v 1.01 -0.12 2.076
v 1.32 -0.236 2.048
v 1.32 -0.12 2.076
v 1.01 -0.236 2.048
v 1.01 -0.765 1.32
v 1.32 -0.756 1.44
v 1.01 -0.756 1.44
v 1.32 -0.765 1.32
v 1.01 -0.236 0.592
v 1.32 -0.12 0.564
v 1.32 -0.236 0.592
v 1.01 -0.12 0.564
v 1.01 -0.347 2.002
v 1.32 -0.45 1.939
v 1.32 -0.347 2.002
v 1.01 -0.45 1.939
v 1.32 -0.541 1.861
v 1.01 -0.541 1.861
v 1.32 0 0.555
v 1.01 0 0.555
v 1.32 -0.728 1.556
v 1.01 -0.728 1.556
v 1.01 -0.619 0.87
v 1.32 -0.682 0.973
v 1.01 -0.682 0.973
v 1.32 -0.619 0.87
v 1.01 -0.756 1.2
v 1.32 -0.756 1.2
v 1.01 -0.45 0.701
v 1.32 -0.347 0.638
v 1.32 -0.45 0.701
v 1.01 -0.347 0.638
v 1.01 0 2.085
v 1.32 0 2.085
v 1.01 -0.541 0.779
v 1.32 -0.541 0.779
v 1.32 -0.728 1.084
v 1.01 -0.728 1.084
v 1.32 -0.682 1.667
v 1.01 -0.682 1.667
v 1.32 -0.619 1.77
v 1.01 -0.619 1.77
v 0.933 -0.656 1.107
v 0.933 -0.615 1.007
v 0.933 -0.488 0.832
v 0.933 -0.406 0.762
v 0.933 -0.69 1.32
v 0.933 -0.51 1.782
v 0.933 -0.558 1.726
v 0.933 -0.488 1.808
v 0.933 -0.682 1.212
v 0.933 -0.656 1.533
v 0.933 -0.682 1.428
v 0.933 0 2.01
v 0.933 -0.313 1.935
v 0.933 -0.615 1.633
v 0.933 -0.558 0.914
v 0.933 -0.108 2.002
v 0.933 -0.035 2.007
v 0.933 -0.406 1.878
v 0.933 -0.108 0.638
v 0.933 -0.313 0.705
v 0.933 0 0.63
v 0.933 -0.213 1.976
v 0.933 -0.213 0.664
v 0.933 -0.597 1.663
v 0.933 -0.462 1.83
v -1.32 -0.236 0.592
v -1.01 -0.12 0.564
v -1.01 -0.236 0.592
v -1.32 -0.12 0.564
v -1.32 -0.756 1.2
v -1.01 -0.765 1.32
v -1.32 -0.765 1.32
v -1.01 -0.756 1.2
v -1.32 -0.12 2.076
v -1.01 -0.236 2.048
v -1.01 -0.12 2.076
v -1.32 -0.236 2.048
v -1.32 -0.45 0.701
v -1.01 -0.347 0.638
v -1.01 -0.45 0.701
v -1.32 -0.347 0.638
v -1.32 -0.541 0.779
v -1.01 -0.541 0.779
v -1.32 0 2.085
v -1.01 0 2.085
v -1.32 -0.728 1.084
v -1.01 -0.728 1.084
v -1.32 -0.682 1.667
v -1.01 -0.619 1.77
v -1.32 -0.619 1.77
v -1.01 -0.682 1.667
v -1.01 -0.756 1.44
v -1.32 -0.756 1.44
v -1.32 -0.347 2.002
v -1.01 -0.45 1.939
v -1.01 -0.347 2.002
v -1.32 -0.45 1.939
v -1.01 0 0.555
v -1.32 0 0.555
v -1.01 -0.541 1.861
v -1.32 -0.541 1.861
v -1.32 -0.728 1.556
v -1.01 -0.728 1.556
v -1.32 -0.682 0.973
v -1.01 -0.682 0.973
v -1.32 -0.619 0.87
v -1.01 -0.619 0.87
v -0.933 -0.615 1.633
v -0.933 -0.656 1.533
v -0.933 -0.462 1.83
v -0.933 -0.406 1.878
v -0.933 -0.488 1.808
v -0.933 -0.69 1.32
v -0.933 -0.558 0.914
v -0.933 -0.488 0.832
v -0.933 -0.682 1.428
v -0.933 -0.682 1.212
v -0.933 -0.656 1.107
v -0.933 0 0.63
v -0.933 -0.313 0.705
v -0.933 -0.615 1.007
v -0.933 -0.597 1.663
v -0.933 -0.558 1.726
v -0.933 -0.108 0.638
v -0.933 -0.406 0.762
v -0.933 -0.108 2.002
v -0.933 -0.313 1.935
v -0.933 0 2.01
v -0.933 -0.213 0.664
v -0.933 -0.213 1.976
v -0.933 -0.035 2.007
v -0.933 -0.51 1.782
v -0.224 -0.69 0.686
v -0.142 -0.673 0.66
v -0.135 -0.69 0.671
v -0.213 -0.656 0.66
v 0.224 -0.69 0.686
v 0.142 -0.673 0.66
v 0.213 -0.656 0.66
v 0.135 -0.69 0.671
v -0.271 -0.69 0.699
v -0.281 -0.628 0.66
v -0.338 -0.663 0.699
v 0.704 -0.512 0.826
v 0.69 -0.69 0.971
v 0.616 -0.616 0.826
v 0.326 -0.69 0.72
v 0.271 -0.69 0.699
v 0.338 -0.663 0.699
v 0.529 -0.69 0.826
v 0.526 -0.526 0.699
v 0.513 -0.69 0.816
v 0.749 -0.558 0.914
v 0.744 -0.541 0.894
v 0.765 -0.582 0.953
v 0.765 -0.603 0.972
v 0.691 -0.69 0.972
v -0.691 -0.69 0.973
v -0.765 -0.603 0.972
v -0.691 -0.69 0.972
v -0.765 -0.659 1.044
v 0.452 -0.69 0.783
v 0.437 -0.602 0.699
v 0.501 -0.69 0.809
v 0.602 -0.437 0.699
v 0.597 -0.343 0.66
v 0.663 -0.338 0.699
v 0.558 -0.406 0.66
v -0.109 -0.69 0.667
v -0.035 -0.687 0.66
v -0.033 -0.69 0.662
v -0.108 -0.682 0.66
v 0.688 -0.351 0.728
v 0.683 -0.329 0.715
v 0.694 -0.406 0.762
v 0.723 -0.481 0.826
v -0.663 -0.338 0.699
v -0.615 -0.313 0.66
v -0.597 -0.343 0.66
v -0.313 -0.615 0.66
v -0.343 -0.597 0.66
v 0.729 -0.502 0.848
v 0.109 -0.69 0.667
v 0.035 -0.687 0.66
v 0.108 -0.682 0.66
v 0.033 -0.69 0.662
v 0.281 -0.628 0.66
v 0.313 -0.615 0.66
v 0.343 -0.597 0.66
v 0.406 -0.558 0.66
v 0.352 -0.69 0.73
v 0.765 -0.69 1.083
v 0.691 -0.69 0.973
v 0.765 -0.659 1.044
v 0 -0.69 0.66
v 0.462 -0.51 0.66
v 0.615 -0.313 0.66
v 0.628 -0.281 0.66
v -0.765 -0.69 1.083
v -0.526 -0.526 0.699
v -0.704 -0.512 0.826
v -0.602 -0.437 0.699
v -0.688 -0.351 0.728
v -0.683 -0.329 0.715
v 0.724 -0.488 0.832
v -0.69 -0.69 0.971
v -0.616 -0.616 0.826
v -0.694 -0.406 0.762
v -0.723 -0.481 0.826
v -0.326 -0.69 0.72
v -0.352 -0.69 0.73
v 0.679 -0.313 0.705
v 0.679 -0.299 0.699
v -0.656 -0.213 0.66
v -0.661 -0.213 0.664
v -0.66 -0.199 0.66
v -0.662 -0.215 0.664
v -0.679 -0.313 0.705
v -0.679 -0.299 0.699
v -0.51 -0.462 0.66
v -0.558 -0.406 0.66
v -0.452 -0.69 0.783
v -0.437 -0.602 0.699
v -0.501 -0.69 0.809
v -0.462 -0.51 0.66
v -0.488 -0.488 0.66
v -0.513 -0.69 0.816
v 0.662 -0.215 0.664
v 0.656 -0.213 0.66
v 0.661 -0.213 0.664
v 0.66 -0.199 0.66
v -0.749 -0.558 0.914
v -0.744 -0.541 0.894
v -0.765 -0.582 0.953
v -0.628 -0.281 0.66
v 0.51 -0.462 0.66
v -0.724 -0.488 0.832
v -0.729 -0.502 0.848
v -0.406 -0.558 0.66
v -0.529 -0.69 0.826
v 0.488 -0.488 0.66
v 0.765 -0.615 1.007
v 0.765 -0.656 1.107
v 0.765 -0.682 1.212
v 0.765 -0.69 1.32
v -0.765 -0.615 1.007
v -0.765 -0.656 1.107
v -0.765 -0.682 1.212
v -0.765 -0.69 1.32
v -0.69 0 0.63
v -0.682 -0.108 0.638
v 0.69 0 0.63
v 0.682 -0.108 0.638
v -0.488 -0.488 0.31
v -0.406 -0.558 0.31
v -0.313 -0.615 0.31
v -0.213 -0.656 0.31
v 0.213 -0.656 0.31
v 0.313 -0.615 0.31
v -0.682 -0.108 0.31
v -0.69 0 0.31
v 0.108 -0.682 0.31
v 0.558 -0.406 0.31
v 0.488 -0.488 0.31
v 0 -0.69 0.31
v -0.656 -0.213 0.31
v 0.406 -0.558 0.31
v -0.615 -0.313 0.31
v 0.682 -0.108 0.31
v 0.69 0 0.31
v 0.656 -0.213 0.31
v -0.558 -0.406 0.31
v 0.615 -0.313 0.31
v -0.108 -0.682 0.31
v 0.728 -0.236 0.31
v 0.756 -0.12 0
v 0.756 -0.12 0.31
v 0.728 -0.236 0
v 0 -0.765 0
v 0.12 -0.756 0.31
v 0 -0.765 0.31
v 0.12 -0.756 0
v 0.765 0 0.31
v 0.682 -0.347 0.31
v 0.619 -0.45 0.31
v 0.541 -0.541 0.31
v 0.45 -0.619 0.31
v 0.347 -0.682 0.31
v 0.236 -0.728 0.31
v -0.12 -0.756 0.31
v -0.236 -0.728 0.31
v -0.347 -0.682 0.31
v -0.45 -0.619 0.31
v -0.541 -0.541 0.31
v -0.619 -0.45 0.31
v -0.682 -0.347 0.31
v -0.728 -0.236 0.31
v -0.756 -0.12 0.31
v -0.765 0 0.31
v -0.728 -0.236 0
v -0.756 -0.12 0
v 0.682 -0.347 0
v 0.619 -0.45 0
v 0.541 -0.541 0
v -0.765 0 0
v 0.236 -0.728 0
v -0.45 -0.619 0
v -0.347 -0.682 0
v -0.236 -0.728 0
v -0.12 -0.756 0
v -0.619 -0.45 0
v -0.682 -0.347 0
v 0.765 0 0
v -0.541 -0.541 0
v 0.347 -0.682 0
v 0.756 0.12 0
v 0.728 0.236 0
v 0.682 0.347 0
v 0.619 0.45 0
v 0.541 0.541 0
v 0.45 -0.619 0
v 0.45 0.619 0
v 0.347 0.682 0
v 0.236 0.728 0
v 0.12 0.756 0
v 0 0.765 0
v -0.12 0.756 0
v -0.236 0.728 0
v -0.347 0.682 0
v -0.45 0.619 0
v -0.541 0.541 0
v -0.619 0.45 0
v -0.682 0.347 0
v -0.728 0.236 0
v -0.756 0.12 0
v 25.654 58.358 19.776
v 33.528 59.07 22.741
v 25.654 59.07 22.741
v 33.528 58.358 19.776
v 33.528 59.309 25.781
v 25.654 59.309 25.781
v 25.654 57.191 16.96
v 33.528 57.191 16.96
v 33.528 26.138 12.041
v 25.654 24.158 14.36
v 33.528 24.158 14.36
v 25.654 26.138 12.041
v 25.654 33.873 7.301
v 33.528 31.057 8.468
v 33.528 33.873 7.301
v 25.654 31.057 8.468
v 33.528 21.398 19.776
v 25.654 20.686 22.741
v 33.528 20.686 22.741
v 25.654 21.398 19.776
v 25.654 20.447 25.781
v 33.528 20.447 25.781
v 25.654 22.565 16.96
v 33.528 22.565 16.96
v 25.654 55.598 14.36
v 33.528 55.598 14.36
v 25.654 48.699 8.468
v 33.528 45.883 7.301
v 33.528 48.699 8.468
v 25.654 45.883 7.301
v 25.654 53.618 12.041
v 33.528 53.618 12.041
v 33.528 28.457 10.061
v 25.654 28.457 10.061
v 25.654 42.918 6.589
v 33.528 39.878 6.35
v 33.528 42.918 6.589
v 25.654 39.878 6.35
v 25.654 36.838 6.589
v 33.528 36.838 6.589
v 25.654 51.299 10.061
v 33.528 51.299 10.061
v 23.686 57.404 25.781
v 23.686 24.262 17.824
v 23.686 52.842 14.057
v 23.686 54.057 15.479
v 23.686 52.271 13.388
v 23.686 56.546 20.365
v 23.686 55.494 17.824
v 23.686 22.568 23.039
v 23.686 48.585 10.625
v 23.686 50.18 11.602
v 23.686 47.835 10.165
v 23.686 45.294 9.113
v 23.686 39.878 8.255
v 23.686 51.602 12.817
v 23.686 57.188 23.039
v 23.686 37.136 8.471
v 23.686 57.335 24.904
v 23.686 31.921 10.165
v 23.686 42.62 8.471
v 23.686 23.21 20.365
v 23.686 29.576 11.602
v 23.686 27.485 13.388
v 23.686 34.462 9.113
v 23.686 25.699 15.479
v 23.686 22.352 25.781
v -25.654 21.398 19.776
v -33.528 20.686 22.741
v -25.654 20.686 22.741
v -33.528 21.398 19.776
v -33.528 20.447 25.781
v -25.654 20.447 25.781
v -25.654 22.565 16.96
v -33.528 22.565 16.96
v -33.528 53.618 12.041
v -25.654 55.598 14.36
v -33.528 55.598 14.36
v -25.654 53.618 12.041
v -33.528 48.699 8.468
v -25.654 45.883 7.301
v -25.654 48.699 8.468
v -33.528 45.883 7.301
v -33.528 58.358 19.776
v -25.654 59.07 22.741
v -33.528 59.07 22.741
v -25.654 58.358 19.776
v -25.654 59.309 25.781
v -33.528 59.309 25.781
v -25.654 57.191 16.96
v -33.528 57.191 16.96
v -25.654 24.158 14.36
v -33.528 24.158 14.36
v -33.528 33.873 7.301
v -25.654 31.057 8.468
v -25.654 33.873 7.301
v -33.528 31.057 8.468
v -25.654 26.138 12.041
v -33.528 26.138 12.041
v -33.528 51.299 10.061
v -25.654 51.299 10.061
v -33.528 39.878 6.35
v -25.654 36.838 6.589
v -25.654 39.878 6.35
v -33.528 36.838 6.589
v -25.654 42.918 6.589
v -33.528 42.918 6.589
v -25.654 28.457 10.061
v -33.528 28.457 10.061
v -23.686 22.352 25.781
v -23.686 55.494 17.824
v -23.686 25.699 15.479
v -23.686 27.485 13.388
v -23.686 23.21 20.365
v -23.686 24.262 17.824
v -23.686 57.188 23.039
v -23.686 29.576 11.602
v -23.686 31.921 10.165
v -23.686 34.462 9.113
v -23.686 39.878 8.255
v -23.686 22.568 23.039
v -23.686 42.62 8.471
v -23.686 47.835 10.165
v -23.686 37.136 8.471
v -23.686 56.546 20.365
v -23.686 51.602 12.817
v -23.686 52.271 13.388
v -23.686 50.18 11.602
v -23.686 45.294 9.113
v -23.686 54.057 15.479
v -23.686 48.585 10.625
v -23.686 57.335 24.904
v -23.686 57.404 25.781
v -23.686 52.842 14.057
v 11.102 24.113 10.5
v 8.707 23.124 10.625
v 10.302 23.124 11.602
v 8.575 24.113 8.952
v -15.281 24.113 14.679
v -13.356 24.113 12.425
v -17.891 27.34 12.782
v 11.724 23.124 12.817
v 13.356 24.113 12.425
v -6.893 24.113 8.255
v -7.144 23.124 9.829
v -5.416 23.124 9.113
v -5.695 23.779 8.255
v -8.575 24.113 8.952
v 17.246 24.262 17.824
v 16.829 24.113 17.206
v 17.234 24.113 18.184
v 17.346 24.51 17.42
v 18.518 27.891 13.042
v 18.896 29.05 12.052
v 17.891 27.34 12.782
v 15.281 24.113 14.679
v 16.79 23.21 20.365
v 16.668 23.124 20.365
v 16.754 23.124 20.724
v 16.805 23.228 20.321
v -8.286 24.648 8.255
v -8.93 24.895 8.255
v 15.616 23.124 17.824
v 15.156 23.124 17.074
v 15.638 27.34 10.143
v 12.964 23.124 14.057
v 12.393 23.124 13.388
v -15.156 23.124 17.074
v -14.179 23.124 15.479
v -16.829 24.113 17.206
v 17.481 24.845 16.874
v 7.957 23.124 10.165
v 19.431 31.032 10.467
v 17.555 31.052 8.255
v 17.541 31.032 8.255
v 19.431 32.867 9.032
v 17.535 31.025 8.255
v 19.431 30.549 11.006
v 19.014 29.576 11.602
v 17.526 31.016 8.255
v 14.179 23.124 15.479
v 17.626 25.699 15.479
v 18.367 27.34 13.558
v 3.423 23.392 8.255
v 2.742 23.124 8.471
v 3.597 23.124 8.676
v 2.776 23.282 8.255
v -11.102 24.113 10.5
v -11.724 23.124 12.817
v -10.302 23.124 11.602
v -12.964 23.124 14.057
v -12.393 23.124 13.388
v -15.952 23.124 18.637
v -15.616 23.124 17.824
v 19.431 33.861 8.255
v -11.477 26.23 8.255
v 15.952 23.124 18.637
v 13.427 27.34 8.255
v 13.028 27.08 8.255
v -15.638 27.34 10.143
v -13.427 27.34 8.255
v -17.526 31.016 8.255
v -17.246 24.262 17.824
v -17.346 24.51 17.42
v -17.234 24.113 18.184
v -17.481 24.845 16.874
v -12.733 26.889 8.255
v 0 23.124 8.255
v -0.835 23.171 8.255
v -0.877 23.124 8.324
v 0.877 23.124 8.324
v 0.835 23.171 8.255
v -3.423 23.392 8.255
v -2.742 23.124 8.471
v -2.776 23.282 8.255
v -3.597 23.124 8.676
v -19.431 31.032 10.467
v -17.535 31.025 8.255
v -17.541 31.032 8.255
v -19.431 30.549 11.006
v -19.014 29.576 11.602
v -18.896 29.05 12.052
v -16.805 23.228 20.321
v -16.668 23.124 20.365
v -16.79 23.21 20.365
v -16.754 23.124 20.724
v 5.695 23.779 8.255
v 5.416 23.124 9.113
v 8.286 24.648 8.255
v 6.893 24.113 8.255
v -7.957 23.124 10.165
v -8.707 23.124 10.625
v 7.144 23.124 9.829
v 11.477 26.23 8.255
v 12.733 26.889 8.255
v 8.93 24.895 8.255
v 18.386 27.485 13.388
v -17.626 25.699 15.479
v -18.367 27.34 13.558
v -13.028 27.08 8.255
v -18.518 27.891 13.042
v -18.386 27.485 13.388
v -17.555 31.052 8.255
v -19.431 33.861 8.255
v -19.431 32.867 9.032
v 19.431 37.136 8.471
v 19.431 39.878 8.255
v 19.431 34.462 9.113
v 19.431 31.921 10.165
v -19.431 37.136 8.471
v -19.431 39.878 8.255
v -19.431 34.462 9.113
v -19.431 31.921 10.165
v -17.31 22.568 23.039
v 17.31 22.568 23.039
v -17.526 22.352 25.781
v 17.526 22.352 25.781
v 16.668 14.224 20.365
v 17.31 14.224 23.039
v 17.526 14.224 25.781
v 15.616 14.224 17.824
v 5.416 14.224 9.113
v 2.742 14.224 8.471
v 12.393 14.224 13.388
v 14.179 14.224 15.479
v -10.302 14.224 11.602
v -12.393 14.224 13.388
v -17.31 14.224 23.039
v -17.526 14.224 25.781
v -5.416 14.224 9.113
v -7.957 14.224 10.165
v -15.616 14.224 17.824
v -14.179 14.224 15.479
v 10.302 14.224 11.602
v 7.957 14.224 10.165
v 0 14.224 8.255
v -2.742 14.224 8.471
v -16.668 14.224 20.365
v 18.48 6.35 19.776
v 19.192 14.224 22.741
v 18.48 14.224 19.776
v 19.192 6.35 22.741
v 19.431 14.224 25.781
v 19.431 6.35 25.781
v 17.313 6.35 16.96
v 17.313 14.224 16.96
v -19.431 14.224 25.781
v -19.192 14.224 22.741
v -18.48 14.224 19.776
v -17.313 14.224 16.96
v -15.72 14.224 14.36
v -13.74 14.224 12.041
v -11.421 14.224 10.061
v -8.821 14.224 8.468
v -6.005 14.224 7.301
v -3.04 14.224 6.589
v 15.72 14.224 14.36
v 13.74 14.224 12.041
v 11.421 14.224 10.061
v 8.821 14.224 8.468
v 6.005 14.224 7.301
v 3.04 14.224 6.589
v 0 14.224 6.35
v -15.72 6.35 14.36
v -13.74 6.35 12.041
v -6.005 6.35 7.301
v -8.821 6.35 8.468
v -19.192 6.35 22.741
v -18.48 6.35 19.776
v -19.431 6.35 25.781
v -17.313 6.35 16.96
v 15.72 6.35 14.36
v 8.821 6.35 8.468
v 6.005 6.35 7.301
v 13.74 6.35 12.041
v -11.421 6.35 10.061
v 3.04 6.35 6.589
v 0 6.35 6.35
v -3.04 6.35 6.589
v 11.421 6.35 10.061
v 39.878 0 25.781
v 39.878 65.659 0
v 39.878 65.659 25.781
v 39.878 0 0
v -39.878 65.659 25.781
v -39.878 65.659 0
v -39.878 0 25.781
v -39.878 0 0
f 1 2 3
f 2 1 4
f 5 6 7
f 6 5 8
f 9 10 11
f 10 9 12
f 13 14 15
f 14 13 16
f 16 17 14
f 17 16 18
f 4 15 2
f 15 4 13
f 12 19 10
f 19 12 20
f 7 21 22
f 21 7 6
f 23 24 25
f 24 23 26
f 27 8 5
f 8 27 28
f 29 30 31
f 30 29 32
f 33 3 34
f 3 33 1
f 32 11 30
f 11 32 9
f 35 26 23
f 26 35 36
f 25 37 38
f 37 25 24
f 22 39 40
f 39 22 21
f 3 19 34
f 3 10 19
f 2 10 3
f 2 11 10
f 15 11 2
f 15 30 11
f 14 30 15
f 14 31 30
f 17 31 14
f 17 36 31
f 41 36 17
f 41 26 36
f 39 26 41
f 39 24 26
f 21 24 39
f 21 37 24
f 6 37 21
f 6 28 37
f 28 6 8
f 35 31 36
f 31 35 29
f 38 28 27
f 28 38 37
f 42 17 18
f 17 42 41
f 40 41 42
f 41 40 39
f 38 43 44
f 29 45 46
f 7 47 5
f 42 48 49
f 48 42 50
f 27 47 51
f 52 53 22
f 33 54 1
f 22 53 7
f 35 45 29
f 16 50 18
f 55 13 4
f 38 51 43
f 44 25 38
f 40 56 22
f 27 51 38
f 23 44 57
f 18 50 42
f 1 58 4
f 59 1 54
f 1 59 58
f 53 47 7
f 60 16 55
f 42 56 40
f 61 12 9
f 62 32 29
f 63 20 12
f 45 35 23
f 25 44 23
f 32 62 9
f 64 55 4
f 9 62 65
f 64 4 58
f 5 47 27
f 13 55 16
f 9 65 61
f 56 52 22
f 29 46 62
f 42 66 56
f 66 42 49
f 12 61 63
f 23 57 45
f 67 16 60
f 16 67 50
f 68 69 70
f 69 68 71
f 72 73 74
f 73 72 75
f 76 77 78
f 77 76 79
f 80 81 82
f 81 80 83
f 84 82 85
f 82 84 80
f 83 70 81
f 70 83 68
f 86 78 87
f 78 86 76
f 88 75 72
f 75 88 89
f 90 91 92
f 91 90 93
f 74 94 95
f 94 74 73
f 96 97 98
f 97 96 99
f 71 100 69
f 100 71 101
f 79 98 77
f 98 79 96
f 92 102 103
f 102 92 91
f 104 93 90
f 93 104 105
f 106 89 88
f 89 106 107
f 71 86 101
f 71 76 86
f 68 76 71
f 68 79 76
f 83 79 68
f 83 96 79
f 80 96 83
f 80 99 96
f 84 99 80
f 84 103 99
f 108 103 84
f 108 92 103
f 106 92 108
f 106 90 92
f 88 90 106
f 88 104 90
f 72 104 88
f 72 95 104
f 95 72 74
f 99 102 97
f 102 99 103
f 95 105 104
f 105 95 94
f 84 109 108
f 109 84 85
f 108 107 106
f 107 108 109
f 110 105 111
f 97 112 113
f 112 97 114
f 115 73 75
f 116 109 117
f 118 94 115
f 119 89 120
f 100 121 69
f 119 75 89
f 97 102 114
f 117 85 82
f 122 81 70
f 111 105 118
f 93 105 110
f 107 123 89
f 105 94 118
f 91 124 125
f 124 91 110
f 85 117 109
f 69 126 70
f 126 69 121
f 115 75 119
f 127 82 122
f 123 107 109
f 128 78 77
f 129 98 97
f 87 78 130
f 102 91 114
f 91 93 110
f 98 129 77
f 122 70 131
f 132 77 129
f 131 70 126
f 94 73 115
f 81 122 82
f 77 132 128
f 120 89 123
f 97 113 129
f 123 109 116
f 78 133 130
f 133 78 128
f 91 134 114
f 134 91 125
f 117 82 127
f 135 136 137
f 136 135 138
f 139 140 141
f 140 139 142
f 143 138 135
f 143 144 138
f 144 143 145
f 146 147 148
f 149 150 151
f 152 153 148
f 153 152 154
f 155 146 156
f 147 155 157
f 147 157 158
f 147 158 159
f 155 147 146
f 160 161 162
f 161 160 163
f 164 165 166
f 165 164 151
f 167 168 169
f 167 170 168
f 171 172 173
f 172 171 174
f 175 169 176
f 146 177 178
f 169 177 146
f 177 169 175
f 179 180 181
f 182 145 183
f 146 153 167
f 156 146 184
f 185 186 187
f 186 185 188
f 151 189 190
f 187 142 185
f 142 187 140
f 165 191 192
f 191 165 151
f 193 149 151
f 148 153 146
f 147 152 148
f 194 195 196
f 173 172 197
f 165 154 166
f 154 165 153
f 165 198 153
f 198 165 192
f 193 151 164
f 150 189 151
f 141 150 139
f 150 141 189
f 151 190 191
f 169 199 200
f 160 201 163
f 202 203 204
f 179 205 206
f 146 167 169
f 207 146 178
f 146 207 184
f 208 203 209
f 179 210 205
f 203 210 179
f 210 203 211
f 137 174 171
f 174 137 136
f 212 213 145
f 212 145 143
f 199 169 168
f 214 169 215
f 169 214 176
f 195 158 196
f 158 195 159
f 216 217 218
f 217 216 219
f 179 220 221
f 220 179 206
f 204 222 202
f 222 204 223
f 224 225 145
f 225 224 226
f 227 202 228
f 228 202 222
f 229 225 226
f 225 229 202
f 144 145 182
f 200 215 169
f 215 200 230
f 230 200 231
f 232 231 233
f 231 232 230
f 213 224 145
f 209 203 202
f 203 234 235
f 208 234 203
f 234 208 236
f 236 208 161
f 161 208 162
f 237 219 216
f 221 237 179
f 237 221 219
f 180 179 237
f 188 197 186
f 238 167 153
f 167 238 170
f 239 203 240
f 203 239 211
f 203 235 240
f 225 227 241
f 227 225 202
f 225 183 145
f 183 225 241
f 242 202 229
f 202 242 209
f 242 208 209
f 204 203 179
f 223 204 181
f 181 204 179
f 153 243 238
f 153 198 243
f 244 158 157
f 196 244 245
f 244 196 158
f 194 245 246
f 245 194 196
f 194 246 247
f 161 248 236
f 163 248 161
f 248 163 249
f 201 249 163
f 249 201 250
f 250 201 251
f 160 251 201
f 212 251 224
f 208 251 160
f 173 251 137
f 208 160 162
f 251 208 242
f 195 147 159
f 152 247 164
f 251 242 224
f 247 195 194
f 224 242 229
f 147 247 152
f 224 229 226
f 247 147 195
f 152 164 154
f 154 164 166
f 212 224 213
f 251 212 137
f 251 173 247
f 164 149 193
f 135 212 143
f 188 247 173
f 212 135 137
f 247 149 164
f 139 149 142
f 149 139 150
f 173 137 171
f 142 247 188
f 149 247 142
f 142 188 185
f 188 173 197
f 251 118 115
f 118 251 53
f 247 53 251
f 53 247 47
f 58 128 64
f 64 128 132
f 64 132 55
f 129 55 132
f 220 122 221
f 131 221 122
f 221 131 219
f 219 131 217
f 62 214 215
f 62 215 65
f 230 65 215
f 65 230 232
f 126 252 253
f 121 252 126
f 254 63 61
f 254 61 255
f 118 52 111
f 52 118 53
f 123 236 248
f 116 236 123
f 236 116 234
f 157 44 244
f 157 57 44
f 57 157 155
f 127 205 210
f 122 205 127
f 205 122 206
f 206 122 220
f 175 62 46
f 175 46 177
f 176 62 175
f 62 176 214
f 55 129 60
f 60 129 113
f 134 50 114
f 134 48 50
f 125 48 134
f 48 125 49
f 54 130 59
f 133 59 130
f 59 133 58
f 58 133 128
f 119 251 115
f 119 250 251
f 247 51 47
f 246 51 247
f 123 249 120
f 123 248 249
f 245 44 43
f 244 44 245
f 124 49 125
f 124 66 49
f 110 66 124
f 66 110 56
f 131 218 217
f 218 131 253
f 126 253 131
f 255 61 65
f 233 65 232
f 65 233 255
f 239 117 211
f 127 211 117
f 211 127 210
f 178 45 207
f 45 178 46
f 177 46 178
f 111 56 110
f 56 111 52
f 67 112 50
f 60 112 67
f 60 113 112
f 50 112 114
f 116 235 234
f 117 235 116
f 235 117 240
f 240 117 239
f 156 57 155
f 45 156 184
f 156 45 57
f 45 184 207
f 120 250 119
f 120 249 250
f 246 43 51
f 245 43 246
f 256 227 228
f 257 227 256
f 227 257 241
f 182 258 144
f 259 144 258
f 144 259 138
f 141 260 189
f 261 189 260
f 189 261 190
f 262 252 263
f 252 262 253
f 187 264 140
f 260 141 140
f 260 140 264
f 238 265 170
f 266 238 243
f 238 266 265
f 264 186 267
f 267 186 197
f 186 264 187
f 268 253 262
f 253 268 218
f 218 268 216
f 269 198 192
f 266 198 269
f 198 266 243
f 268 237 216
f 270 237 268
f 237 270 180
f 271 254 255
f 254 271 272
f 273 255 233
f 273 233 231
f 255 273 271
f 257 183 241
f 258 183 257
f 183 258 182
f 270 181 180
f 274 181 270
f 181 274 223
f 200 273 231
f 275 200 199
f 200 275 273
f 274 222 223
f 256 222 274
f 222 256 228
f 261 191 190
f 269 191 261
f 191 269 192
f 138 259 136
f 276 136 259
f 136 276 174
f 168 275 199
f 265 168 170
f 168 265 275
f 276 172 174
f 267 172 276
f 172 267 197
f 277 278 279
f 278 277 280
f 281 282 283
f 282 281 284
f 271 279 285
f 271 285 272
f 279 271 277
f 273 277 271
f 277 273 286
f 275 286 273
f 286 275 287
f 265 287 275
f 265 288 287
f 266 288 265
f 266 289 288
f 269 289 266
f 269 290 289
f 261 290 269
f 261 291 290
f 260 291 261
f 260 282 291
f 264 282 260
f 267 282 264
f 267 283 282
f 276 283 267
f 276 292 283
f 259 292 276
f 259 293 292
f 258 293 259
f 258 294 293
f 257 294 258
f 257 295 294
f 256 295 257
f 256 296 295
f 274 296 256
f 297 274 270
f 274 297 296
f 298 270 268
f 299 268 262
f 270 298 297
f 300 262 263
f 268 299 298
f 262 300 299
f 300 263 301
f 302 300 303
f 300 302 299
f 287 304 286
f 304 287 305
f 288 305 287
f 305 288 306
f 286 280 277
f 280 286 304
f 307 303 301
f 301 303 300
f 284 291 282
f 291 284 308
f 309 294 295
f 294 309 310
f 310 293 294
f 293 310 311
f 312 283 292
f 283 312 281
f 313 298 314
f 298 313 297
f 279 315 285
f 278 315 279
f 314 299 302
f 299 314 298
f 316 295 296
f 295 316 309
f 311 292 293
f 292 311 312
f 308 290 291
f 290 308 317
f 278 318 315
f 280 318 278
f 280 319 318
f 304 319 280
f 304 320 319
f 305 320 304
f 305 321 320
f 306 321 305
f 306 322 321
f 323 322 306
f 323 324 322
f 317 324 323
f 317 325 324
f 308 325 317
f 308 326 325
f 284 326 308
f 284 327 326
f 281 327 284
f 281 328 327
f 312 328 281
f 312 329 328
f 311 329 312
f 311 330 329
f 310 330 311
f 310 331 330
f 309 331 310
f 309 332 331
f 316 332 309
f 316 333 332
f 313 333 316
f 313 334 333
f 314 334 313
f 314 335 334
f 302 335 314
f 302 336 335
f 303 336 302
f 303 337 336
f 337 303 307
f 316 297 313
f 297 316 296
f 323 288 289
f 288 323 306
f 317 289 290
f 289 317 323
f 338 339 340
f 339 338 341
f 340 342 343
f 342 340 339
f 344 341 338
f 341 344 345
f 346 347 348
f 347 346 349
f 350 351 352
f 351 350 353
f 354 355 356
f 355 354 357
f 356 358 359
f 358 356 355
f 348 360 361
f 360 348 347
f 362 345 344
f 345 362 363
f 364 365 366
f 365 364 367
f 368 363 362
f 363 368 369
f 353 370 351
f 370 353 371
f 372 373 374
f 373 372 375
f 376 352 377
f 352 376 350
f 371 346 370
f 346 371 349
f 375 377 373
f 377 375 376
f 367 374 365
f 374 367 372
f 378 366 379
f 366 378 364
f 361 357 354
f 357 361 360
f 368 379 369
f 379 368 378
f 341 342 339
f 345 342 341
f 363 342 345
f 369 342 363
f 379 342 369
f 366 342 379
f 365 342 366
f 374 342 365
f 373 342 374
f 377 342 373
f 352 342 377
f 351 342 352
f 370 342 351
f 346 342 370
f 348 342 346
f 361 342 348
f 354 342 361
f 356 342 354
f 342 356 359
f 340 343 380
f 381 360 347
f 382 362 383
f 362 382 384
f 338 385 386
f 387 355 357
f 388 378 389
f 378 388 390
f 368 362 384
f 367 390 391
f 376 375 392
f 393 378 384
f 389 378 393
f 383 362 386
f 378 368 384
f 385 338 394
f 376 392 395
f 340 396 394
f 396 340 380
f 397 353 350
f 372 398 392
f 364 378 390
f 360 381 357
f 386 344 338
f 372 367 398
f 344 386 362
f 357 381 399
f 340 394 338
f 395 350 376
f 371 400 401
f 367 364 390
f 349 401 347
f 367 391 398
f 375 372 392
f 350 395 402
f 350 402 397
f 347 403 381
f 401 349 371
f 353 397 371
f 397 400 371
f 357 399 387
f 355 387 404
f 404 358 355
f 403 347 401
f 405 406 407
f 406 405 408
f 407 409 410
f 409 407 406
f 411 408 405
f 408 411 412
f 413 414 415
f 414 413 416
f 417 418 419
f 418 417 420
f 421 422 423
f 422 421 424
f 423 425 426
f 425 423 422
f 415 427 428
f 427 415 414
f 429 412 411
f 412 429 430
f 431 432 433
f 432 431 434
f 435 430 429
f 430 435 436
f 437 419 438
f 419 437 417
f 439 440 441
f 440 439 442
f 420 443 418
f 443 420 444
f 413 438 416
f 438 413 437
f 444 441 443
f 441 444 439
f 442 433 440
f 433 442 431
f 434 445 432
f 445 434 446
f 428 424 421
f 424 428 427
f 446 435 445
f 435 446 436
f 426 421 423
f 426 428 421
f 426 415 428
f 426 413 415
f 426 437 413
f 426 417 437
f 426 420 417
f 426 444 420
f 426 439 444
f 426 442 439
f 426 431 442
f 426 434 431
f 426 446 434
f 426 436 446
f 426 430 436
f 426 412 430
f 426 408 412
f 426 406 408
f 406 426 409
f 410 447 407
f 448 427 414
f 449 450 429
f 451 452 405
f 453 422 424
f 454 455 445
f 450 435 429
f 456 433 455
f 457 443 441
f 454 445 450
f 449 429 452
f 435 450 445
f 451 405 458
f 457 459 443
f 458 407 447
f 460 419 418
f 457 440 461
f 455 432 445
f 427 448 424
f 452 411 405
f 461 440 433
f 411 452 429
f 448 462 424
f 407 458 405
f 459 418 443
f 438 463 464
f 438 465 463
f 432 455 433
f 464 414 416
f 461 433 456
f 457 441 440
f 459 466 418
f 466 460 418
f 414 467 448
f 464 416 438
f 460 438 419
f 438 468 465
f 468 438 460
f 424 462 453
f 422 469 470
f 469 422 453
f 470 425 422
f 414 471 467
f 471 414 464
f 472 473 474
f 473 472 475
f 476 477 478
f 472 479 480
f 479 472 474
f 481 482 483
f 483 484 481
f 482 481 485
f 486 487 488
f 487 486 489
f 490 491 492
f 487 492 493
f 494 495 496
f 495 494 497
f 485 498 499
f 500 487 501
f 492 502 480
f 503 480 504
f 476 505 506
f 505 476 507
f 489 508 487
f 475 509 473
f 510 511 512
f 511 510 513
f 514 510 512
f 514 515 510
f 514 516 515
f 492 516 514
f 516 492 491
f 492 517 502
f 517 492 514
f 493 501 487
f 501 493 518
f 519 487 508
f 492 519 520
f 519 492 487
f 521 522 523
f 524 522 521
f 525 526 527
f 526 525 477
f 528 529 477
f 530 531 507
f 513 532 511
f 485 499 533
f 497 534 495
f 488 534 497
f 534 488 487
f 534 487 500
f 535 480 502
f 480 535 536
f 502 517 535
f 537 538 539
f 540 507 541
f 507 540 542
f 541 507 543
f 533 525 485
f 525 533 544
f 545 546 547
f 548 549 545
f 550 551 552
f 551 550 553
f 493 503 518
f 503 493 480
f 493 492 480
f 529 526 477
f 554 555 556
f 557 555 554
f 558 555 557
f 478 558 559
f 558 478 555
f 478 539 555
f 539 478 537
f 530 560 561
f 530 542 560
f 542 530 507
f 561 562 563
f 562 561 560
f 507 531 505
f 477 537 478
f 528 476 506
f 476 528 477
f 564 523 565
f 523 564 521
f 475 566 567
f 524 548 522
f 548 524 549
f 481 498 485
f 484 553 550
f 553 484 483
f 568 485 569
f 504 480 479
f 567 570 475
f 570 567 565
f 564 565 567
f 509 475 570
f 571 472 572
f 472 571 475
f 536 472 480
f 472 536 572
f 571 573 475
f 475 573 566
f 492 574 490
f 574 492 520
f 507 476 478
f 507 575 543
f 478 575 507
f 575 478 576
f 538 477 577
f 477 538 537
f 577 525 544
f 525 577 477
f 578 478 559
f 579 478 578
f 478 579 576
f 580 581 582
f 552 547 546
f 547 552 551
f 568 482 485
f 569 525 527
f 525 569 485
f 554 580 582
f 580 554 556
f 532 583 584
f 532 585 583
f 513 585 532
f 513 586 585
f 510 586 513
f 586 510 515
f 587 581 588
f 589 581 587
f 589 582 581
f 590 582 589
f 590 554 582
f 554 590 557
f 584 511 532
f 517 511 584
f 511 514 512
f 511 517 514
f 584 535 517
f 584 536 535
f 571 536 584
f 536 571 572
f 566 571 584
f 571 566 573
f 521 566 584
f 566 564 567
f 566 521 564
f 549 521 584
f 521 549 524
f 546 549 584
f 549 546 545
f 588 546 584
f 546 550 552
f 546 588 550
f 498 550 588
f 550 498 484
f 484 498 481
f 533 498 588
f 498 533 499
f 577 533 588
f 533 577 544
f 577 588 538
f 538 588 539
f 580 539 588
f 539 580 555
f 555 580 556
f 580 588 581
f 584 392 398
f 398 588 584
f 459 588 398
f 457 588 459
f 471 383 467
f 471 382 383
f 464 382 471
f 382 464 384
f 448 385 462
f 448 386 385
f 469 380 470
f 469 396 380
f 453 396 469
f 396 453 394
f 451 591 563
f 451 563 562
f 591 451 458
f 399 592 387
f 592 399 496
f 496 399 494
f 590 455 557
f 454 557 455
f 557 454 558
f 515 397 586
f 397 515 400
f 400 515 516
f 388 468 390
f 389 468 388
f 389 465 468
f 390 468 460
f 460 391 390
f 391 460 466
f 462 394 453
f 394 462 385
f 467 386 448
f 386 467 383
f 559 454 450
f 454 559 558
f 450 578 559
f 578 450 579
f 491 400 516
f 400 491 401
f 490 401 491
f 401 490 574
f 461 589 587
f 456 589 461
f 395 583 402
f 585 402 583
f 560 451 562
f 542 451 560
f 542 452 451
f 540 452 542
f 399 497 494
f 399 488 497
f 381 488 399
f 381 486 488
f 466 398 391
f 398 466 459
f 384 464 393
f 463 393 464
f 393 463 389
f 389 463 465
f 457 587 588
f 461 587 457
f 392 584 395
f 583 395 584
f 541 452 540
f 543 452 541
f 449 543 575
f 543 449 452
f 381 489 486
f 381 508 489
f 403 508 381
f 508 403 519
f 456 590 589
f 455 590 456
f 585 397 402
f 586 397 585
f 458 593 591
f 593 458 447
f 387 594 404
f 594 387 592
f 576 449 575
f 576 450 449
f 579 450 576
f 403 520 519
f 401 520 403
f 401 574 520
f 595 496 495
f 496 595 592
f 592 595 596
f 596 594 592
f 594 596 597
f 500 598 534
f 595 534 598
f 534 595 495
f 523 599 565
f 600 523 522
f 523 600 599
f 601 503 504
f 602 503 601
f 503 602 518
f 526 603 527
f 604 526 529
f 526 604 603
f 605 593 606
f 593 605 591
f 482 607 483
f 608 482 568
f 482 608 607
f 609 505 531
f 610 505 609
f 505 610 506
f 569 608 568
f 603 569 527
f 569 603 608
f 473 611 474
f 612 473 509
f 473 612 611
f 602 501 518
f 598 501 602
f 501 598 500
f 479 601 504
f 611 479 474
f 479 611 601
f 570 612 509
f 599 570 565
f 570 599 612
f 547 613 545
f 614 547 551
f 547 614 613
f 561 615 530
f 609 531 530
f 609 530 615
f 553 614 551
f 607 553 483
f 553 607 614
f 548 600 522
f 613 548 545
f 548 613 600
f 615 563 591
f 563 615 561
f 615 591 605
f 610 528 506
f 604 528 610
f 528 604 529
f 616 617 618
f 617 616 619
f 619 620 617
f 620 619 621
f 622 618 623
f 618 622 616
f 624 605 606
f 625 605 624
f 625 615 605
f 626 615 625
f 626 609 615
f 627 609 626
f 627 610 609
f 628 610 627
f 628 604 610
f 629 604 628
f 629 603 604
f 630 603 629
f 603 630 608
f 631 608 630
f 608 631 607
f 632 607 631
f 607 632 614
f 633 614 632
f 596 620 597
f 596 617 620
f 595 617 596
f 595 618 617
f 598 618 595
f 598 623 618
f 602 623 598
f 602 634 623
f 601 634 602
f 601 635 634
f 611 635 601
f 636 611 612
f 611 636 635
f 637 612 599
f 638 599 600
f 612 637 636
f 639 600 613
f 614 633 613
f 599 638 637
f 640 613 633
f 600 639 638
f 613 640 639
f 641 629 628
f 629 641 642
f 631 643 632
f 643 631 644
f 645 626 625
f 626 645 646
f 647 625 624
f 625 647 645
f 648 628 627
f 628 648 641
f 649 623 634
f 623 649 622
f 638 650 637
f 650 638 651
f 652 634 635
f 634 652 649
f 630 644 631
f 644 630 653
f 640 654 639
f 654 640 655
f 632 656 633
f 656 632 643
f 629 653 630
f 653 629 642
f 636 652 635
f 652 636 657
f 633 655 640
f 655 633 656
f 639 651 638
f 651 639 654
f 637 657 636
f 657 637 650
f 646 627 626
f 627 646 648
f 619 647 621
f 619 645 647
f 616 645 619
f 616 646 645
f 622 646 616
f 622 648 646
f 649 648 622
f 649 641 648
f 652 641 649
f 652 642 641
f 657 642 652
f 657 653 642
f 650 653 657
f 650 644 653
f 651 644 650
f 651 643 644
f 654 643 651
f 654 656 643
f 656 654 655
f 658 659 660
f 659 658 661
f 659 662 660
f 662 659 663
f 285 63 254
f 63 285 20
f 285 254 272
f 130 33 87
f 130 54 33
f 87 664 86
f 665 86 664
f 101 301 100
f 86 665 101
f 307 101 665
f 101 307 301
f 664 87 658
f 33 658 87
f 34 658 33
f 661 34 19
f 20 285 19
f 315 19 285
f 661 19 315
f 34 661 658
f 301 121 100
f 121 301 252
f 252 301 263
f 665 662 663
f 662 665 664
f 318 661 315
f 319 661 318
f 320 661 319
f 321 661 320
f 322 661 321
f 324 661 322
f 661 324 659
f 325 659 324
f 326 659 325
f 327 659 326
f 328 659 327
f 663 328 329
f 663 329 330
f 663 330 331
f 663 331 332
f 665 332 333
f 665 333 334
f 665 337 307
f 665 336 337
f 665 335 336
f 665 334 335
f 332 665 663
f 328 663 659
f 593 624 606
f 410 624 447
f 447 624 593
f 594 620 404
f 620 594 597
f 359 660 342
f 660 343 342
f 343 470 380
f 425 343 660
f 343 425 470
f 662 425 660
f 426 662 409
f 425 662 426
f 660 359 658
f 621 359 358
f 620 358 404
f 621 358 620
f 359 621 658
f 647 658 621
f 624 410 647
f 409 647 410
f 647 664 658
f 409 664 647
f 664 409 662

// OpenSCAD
// file: ../Vitamins/Pipe.scad
//
// Pipe dimensions
//
PipeInnerDiameter   = 1; // Inner Diameter of pipe, smallest measurement if asymmetrical
PipeOuterDiameter   = 2; // Outer Diameter of pipe, largest measurement if asymmetrical
PipeTaperedDiameter = 3; // Threads are tapered, smallest measurement if asymmetrical
PipeThreadLength    = 4; // Total length of the pipe thread
PipeThreadDepth     = 5; // Depth when fully seated
PipeClearanceSnug   = 6; // Added to the diameter, should not slip
PipeClearanceLoose  = 7; // Added to the diameter, should slide freely
PipeFn              = 8; // Number of sides
PipeWeightPerUnit   = 9;

function PipeClearance(pipe, clearance)     = (clearance != undef) ? lookup(clearance, pipe) : 0;
function PipeOuterDiameter(pipe, clearance) = lookup(PipeOuterDiameter, pipe) + PipeClearance(clearance);
function PipeInnerDiameter(pipe, clearance) = lookup(PipeInnerDiameter, pipe) + PipeClearance(clearance);
function PipeOuterRadius(pipe, clearance)   = PipeOuterDiameter(pipe, clearance)/2;
function PipeInnerRadius(pipe, clearance)   = PipeInnerDiameter(pipe, clearance)/2;
function PipeWall(pipe)                     = PipeOuterRadius(pipe) - PipeInnerRadius(pipe);

module Pipe(pipe, length = 1, clearance=undef) {
  cylinder(r=PipeOuterRadius(pipe, clearance=clearance), h=length, $fn=lookup(PipeFn, pipe));
};

//Pipe(PipeOneInch, clearance=PipeClearanceLoose);


// 1/4" Pipe
PipeOneQuarterInch = [
  [PipeInnerDiameter,   0.265],
  [PipeOuterDiameter,   0.415],
  [PipeTaperedDiameter, 0.415], // TODO: Verify
  [PipeThreadLength,    0.5],   // TODO: Verify
  [PipeThreadDepth,     0.25],  // TODO: Verify
  [PipeClearanceSnug,   0.015], // TODO: Verify
  [PipeClearanceLoose,  0.027], // TODO: Verify
  [PipeFn,              20],
  [PipeWeightPerUnit,   0] // TODO
];


// 3/4" Pipe
PipeThreeQuartersInch = [
  [PipeInnerDiameter,   0.81],
  [PipeOuterDiameter,   1.07],
  [PipeTaperedDiameter, 1.018],
  [PipeThreadLength,    0.9],
  [PipeThreadDepth,     0.5],
  [PipeClearanceSnug,   0.005],
  [PipeClearanceLoose,  0.027],
  [PipeFn,              30],
  [PipeWeightPerUnit,   0] // TODO
];

// 1" Pipe
PipeOneInch = [
  [PipeInnerDiameter,   1.06],
  [PipeOuterDiameter,   1.315],
  [PipeTaperedDiameter, 1.285],
  [PipeThreadLength,    0.982],
  [PipeThreadDepth,     0.5], // TODO: Verify
  [PipeClearanceSnug,   0.02],
  [PipeClearanceLoose,  0.03],
  [PipeFn,              30],
  [PipeWeightPerUnit,   0] // TODO
];


// Fittings: Tee
TeeOuterDiameter = 1; // Diameter of the body, not the rim
TeeWidth         = 2; // Across the top of the tee, side-to-side
TeeHeight        = 3; // From the middle of the bottom rim to the top of the body
TeeInnerDiameter = 4; // Diameter of the threaded hole
TeeRimDiameter   = 5; // Diameter of the tee rim
TeeRimWidth      = 6; // Width of the tee rim
TeeInfillSphere  = 7; // Diameter of the infill sphere, cuts out the casting infill between the tee sections
TeeInfillOffset  = 8; // Offset for the infill sphere from center

TeeThreeQuarterInch = [
  [TeeOuterDiameter, 1.38],
  [TeeWidth,         2.64],
  [TeeHeight,        2.01],
  [TeeInnerDiameter, 0.88],
  [TeeRimDiameter,   1.53],
  [TeeRimWidth,      0.31],
  [TeeInfillSphere,  0.25],
  [TeeInfillOffset,  0.38]
];

function TeeOuterDiameter(tee) = lookup(TeeOuterDiameter, tee);
function TeeOuterRadius(tee)   = lookup(TeeOuterDiameter, tee)/2;
function TeeWidth(tee)         = lookup(TeeWidth, tee);
function TeeHeight(tee)        = lookup(TeeHeight, tee);
function TeeInnerDiameter(tee) = lookup(TeeInnerDiameter, tee);
function TeeInnerRadius(tee)   = lookup(TeeInnerDiameter, tee)/2;
function TeeRimDiameter(tee)   = lookup(TeeRimDiameter, tee);
function TeeRimRadius(tee)     = lookup(TeeRimDiameter, tee)/2;
function TeeRimWidth(tee)      = lookup(TeeRimWidth, tee);
function TeeCenter(tee)        = lookup(TeeHeight, tee) - TeeOuterRadius(tee);

module Tee(tee, $fn=40) {
   union() {

     // Top Body
     rotate([0,-90,0])
     translate([TeeHeight(tee) - (TeeOuterDiameter(tee)/2),0,0])
     cylinder(r=TeeOuterRadius(tee), h=TeeWidth(tee) * 0.99, center=true);

     // Bottom Body
     translate([0,0,TeeCenter(tee) * 0.01])
     cylinder(r=TeeOuterRadius(tee), h=TeeCenter(tee) * 0.98);

     // Bottom Rim
     cylinder(r=TeeRimRadius(tee), h=TeeRimWidth(tee));
     
    
    // Rims
    for (i = [1, -1]) {
      
      // Rim
      translate([i*TeeWidth(tee)/2,0,TeeCenter(tee)])
      rotate([0,i*-90,0]) {
      cylinder(r=TeeRimRadius(tee), h=TeeRimWidth(tee));
      
      // Casting Infill
      translate([0,0,TeeRimWidth(tee)])
      cylinder(r1=TeeRimRadius(tee),
               r2=TeeOuterRadius(tee),
                h=TeeRimWidth(tee)*1/4);
      }
    }
    
    // Tee Body Casting Infill
    // TODO: Tweak this? Could be better, could be worse.
    intersection() {
      translate([0,0,TeeCenter(tee) + lookup(TeeInfillSphere, tee)])
      sphere(r=TeeRimRadius(tee) + lookup(TeeInfillOffset, tee));

      translate([-TeeRimRadius(tee),-TeeOuterRadius(tee),0])
      cube([TeeRimDiameter(tee),TeeOuterDiameter(tee),TeeCenter(tee)]);
    }
   }
};

Tee(TeeThreeQuarterInch);

module TeeRim(tee=TeeThreeQuarterInch, heightMultiplier=1) {
  cylinder(r=TeeRimRadius(tee), h=TeeRimWidth(tee) * heightMultiplier);
}

// Fittings: Bushings
BushingHeight    = 1;
BushingDiameter  = 2;
BushingDepth     = 3; // Bushing screws in about half an inch
BushingCapWidth  = 4;
BushingCapHeight = 5;


// 3/4" Bushing
BushingThreeQuarterInch = [
  [BushingHeight,    0.955],
  [BushingDiameter,  1],
  [BushingDepth,     0.5],
  [BushingCapWidth,  1.225],
  [BushingCapHeight, 0.215]
];

function BushingHeight(bushing) = lookup(BushingHeight, bushing);
function BushingDepth(bushing) = lookup(BushingDepth, bushing);

module Bushing(spec=BushingThreeQuarterInch) {

  od        = lookup(BushingDiameter, spec);
  height    = lookup(BushingHeight, spec);
  capWidth  = lookup(BushingCapWidth, spec);
  capHeight = lookup(BushingCapHeight, spec);

  union() {

    // Body
    translate([0,0,capHeight/2])
    cylinder(r=od/2, h=height - (capHeight/2), $fn=20);

    // Head
    cylinder(r=capWidth/2, h=capHeight, $fn=6);
  }
}
// main file
include <../Vitamins/Pipe.scad>;

wall = 1/4;

module TeeHalf(receiverTee=TeeThreeQuarterInch, wall=1/4) {
  rotate([-90,0,0])
  translate([0,-TeeRimRadius(receiverTee) -wall,wall])
  difference() {
    translate([-TeeWidth(receiverTee)/2 - wall,0,-wall])
    cube([TeeWidth(receiverTee) + wall*2,TeeRimDiameter(receiverTee)/2 + wall,TeeHeight(receiverTee) + (TeeRimDiameter(receiverTee) - TeeOuterDiameter(receiverTee))/2 + wall*2]);

    Tee(receiverTee);
  }
}

scale([25.4, 25.4, 25.4])
TeeHalf();
